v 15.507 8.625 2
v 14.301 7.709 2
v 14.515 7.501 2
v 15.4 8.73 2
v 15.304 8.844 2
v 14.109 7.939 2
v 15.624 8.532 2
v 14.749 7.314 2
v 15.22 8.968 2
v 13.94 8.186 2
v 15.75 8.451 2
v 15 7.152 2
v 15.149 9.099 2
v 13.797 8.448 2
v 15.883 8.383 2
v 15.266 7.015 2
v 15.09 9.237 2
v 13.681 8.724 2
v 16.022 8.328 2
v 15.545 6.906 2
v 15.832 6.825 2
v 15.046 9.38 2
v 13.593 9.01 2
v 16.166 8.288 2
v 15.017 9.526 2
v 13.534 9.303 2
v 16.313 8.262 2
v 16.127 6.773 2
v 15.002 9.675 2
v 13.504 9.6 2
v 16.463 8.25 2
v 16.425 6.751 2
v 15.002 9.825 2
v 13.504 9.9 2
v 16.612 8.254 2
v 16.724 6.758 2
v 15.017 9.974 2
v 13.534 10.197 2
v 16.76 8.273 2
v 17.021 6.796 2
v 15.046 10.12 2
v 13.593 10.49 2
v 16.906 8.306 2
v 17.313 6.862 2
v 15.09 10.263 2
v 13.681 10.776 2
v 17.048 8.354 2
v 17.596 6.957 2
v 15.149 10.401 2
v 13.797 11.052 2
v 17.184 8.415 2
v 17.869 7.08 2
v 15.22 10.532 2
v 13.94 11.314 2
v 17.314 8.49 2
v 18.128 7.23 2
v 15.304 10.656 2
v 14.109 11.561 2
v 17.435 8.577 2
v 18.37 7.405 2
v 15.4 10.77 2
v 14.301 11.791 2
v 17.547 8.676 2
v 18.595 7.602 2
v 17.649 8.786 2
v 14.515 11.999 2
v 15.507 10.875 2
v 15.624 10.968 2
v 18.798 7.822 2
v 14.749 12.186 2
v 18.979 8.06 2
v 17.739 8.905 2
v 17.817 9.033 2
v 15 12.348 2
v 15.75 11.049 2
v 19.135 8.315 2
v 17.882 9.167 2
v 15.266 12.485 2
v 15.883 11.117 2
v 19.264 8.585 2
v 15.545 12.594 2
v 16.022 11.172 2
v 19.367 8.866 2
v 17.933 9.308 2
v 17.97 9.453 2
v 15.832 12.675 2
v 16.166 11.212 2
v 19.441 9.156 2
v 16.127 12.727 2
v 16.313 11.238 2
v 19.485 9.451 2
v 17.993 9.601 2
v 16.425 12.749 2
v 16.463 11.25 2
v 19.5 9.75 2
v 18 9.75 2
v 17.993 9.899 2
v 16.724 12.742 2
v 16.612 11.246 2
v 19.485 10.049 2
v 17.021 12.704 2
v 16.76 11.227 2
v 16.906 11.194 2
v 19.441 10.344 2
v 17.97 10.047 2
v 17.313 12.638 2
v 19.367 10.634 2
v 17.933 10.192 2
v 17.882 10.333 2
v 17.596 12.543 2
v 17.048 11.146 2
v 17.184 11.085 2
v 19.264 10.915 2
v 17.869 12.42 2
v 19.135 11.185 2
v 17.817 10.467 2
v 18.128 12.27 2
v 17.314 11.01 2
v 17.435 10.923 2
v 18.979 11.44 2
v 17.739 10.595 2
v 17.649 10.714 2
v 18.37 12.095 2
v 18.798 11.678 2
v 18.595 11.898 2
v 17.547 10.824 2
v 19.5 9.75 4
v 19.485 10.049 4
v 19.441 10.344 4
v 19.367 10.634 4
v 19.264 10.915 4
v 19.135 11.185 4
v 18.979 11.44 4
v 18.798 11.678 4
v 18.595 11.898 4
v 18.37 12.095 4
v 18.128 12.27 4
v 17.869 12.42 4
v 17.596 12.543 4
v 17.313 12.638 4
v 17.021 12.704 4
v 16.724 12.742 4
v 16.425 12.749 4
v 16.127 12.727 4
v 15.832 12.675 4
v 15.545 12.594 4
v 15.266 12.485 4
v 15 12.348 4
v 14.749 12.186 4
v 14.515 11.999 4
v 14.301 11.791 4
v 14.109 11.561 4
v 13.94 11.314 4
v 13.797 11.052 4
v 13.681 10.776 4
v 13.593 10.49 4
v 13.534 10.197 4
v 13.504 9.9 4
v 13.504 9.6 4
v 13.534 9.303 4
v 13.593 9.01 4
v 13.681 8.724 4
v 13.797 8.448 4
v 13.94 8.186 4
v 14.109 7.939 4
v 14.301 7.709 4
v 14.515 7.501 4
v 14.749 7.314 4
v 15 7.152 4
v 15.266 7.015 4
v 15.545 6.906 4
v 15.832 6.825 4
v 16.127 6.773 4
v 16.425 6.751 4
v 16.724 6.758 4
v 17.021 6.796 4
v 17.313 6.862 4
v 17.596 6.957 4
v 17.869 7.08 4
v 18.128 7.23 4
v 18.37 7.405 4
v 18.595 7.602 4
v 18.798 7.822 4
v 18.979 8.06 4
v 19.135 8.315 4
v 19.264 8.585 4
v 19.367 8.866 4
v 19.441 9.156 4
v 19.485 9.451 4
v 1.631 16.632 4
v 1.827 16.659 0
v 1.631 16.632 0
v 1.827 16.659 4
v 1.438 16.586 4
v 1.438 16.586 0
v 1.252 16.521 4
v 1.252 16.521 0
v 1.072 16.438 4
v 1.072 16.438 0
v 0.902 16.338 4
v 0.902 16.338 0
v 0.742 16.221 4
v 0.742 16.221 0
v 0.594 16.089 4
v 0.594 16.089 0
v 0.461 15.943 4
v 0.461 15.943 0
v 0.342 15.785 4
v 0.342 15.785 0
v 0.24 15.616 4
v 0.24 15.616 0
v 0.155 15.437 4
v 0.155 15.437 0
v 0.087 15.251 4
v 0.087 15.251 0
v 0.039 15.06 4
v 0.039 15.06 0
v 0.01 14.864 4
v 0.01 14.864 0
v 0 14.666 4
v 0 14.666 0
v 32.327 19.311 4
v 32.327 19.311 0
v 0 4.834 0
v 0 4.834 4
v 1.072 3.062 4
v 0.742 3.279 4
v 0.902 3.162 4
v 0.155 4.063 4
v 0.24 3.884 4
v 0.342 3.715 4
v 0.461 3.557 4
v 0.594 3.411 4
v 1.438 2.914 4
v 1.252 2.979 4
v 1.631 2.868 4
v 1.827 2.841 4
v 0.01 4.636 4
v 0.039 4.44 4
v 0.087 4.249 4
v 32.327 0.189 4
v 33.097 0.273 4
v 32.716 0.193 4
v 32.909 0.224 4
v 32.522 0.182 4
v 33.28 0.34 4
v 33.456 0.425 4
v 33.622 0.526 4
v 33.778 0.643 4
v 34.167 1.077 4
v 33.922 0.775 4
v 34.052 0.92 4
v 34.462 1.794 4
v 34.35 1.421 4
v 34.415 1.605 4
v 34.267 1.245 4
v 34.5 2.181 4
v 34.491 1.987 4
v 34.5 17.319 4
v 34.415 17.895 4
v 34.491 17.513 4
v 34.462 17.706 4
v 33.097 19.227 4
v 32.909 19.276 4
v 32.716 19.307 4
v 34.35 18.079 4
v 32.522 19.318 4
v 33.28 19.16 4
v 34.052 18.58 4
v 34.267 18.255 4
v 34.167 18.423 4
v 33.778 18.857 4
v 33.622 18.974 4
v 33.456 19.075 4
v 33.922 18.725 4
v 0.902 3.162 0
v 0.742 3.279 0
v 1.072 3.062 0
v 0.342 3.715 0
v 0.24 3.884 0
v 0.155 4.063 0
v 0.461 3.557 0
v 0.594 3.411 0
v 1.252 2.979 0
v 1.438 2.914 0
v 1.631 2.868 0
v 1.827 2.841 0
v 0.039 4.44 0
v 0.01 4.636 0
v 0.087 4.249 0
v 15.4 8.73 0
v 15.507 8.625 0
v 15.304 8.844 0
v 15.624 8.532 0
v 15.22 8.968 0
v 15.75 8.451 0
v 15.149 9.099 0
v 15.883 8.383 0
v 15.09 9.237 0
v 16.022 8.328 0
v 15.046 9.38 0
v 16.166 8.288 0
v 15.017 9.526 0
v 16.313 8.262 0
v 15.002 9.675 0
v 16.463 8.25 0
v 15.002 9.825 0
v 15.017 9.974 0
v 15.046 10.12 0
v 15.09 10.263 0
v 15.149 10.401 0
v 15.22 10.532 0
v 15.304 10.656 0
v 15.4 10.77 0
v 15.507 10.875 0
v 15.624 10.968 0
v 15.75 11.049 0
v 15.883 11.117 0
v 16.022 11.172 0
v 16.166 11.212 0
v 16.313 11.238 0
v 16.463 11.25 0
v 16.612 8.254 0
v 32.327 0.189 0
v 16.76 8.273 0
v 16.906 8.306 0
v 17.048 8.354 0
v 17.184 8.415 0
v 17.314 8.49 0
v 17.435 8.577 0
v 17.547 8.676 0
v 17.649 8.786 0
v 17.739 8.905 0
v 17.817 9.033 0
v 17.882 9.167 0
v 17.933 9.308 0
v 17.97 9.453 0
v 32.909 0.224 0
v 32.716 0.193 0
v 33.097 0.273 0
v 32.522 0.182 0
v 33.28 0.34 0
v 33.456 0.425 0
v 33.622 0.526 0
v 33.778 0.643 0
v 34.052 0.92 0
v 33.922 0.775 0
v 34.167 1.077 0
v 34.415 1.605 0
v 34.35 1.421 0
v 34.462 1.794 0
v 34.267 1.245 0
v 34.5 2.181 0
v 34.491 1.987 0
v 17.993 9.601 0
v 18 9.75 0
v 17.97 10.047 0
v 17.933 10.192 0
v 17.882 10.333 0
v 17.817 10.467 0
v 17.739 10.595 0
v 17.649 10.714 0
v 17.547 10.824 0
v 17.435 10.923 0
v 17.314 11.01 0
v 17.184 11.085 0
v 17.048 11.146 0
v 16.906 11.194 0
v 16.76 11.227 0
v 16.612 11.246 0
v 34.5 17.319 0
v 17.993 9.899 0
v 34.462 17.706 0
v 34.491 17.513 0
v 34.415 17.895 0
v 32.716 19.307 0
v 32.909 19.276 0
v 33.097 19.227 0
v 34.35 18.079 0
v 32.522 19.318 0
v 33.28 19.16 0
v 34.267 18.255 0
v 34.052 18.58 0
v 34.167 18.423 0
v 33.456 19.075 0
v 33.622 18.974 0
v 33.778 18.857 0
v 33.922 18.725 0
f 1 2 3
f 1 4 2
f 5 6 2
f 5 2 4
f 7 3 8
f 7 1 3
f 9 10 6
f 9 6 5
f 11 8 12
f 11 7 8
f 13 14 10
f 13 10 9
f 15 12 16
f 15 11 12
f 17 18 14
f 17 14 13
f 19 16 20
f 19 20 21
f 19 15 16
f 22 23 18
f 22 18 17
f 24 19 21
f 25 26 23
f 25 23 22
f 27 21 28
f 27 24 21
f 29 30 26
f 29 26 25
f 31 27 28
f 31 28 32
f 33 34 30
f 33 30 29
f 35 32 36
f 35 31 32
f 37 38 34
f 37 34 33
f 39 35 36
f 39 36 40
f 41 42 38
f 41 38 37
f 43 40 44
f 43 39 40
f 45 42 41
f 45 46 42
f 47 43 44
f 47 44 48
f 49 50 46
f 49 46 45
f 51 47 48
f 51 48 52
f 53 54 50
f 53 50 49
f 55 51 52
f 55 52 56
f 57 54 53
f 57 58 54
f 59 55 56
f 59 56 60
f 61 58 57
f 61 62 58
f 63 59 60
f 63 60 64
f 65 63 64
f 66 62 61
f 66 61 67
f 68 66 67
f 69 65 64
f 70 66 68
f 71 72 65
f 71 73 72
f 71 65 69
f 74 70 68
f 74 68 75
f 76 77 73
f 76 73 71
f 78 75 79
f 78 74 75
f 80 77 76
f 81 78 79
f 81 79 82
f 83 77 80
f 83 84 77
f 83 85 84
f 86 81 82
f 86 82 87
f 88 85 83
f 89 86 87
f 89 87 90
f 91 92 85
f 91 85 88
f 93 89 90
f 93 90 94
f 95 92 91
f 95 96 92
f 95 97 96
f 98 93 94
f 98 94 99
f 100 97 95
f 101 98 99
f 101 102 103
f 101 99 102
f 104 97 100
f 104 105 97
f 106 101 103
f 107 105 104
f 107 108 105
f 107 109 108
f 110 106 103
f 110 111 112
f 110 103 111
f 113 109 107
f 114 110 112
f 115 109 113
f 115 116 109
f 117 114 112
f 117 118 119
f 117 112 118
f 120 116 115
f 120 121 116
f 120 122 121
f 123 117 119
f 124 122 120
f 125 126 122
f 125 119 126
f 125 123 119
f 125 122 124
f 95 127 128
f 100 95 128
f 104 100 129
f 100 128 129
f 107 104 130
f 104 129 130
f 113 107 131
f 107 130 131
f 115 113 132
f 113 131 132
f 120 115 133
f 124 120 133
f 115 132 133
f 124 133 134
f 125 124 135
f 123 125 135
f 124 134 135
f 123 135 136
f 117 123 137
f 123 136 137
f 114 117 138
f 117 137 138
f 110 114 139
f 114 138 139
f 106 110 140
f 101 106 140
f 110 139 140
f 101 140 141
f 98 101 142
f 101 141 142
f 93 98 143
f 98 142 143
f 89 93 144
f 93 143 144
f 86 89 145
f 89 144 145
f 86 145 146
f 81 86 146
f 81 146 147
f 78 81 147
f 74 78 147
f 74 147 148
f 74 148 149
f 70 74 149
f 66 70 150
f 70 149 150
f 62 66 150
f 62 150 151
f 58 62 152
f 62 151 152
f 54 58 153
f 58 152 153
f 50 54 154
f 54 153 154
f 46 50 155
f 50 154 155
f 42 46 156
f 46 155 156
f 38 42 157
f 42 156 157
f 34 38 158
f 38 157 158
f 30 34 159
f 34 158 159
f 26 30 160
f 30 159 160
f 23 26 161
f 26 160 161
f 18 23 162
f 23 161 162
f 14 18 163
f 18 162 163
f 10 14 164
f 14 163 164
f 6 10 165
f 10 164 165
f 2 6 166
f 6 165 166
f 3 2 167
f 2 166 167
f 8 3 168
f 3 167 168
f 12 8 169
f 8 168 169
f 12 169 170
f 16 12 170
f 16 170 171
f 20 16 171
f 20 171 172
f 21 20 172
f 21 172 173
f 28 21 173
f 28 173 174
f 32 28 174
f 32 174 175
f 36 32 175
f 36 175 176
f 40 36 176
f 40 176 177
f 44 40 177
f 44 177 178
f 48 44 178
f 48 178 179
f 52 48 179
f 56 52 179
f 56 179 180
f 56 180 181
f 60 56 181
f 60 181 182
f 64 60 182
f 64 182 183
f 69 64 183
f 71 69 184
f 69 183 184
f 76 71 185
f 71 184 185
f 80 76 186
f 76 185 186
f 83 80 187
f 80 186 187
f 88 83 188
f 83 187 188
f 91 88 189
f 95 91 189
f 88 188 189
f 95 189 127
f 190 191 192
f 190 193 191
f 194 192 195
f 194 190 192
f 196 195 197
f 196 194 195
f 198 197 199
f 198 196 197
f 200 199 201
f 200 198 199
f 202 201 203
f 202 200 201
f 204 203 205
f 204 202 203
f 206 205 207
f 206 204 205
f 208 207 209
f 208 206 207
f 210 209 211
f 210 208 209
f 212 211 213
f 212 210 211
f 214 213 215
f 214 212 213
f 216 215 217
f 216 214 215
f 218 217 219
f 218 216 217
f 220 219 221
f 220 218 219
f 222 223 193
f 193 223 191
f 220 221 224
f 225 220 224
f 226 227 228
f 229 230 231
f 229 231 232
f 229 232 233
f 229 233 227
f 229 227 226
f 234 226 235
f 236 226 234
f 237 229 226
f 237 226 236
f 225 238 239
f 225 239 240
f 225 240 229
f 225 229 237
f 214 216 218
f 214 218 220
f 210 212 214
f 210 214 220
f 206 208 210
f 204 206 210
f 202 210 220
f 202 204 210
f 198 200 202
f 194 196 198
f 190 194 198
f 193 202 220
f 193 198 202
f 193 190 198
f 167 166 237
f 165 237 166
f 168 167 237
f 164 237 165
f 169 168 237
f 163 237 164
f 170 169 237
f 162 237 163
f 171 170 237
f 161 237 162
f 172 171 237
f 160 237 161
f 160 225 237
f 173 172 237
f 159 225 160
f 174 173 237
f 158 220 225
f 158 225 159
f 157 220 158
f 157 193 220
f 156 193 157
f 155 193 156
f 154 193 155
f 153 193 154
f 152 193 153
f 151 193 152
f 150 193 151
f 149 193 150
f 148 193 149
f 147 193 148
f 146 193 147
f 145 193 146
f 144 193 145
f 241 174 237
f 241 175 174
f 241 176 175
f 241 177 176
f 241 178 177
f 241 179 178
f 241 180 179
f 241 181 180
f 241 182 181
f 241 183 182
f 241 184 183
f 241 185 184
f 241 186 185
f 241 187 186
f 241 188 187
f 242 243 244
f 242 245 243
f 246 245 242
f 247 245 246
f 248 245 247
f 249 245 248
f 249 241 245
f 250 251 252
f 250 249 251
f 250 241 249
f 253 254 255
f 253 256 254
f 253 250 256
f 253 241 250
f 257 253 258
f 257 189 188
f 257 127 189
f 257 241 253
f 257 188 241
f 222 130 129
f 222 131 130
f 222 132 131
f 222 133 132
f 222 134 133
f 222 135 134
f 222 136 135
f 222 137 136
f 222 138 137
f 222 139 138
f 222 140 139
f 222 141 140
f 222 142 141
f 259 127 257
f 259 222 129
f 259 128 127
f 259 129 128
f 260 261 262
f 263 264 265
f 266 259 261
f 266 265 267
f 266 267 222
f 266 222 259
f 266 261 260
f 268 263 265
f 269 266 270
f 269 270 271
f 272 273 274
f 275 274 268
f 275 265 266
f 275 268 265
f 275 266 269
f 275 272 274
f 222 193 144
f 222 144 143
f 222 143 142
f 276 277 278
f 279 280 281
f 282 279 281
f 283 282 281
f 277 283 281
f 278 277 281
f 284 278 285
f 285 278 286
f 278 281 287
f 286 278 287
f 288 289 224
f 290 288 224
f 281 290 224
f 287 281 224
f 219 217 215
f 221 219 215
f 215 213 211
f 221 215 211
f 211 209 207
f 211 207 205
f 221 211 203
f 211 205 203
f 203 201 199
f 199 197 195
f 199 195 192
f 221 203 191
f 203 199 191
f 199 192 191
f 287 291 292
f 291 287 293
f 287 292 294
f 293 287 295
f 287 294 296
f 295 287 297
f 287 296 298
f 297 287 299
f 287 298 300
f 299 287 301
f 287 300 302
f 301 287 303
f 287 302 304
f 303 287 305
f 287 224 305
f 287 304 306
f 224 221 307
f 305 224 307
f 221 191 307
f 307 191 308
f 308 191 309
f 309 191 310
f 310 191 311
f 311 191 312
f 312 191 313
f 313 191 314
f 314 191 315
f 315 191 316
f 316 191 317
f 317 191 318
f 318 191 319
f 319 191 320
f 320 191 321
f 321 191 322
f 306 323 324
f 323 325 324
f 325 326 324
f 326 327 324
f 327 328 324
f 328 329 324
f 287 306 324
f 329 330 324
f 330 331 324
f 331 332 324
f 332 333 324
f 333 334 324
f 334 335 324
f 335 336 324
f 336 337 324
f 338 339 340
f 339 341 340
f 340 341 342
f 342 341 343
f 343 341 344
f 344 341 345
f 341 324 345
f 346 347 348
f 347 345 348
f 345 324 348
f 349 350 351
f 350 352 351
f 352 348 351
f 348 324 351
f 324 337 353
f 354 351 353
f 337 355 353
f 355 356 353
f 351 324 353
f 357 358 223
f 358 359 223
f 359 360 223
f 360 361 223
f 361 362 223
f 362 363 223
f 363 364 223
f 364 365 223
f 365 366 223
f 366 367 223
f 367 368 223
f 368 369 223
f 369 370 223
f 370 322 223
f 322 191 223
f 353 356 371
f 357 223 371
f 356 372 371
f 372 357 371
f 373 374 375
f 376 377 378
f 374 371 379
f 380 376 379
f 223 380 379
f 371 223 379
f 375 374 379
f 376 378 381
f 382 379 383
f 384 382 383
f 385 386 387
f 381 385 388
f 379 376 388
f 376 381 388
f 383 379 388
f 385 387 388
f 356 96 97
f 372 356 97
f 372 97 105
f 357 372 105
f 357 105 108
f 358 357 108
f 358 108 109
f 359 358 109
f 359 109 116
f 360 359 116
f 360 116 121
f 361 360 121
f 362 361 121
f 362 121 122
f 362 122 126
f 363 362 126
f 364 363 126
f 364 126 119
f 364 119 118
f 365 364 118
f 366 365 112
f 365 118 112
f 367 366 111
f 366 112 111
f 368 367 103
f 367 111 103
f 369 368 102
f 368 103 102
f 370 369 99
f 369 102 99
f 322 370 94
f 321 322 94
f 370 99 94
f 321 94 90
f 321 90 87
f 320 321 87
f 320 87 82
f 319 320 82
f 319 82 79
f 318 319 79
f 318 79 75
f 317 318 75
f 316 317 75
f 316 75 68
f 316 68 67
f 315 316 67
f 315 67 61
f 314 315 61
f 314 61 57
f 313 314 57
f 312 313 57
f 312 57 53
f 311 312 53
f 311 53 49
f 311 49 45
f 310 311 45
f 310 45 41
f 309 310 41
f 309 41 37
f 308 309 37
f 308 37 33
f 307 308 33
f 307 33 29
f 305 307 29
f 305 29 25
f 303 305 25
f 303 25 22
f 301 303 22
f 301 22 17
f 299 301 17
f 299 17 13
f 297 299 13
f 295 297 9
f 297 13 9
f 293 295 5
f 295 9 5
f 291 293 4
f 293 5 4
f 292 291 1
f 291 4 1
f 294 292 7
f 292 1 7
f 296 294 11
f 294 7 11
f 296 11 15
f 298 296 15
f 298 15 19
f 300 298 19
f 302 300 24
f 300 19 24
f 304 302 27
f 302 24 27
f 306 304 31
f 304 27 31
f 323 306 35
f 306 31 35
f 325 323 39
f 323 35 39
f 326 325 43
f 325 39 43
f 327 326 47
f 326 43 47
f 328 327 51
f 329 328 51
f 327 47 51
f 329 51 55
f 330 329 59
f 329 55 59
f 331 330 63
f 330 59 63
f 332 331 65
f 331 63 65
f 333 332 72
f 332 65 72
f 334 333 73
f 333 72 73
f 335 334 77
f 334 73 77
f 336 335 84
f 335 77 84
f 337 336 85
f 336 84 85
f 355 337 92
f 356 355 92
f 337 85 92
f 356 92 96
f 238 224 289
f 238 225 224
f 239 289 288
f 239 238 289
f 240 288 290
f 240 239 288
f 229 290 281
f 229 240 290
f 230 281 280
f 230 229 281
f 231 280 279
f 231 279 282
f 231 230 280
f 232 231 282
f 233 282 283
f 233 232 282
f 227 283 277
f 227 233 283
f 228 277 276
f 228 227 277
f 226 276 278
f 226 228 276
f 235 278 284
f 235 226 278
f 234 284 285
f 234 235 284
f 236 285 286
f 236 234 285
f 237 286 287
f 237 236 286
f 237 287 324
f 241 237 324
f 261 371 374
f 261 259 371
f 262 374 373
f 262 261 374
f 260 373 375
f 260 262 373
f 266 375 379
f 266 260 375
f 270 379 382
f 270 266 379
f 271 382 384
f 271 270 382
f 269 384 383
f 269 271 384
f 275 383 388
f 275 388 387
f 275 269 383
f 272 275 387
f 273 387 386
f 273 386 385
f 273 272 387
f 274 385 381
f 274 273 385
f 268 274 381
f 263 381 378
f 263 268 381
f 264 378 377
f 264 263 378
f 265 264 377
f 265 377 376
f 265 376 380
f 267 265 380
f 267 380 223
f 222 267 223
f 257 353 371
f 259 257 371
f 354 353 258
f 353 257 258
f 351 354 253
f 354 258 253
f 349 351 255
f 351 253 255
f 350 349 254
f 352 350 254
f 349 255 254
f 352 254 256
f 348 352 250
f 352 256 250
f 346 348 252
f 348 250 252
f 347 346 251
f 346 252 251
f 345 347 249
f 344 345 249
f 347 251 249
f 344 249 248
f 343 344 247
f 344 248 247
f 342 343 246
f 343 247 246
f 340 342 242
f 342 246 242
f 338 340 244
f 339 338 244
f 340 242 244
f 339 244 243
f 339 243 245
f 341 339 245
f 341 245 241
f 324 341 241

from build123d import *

# Parameters (mm, degrees)
F1_DEPTH = 4
F2_R     = 3
F2_R_2   = 1.5
F3_DEPTH = 2
F4_DEPTH = 4
F5_R     = 2
F6_R     = 2
F7_R     = 2
F8_R     = 2


with BuildPart() as f1:
    # F0 (on Top) → F1 (new body)
    with BuildSketch(Plane.XY):
        Polygon((34.5, 0), (34.5, 19.5), (0, 16.5), (0, 3), align=None)
    extrude(amount=F1_DEPTH)

    # F2 (on face) → F3 (cut)
    with BuildSketch(Plane.XY.offset(4)):
        with Locations((16.5, 9.75)):
            Circle(F2_R)
        with Locations((16.5, 9.75)):
            Circle(F2_R_2, mode=Mode.SUBTRACT)
    extrude(amount=-F3_DEPTH, mode=Mode.SUBTRACT)

    # F4 (cut): a face of the model
    f4_faces = [f1.faces().sort_by_distance(p)[0] for p in [
        (16.5, 9.75, 4),
    ]]
    extrude(f4_faces, amount=-F4_DEPTH, mode=Mode.SUBTRACT)

    # F5
    f5_edges = [f1.edges().sort_by_distance(p)[0] for p in [
        (34.5, 0, 2),
    ]]
    fillet(f5_edges, radius=F5_R)

    # F6
    f6_edges = [f1.edges().sort_by_distance(p)[0] for p in [
        (34.5, 19.5, 2),
    ]]
    fillet(f6_edges, radius=F6_R)

    # F7
    f7_edges = [f1.edges().sort_by_distance(p)[0] for p in [
        (0, 16.5, 2),
    ]]
    fillet(f7_edges, radius=F7_R)

    # F8
    f8_edges = [f1.edges().sort_by_distance(p)[0] for p in [
        (0, 3, 2),
    ]]
    fillet(f8_edges, radius=F8_R)


solid = f1.part
